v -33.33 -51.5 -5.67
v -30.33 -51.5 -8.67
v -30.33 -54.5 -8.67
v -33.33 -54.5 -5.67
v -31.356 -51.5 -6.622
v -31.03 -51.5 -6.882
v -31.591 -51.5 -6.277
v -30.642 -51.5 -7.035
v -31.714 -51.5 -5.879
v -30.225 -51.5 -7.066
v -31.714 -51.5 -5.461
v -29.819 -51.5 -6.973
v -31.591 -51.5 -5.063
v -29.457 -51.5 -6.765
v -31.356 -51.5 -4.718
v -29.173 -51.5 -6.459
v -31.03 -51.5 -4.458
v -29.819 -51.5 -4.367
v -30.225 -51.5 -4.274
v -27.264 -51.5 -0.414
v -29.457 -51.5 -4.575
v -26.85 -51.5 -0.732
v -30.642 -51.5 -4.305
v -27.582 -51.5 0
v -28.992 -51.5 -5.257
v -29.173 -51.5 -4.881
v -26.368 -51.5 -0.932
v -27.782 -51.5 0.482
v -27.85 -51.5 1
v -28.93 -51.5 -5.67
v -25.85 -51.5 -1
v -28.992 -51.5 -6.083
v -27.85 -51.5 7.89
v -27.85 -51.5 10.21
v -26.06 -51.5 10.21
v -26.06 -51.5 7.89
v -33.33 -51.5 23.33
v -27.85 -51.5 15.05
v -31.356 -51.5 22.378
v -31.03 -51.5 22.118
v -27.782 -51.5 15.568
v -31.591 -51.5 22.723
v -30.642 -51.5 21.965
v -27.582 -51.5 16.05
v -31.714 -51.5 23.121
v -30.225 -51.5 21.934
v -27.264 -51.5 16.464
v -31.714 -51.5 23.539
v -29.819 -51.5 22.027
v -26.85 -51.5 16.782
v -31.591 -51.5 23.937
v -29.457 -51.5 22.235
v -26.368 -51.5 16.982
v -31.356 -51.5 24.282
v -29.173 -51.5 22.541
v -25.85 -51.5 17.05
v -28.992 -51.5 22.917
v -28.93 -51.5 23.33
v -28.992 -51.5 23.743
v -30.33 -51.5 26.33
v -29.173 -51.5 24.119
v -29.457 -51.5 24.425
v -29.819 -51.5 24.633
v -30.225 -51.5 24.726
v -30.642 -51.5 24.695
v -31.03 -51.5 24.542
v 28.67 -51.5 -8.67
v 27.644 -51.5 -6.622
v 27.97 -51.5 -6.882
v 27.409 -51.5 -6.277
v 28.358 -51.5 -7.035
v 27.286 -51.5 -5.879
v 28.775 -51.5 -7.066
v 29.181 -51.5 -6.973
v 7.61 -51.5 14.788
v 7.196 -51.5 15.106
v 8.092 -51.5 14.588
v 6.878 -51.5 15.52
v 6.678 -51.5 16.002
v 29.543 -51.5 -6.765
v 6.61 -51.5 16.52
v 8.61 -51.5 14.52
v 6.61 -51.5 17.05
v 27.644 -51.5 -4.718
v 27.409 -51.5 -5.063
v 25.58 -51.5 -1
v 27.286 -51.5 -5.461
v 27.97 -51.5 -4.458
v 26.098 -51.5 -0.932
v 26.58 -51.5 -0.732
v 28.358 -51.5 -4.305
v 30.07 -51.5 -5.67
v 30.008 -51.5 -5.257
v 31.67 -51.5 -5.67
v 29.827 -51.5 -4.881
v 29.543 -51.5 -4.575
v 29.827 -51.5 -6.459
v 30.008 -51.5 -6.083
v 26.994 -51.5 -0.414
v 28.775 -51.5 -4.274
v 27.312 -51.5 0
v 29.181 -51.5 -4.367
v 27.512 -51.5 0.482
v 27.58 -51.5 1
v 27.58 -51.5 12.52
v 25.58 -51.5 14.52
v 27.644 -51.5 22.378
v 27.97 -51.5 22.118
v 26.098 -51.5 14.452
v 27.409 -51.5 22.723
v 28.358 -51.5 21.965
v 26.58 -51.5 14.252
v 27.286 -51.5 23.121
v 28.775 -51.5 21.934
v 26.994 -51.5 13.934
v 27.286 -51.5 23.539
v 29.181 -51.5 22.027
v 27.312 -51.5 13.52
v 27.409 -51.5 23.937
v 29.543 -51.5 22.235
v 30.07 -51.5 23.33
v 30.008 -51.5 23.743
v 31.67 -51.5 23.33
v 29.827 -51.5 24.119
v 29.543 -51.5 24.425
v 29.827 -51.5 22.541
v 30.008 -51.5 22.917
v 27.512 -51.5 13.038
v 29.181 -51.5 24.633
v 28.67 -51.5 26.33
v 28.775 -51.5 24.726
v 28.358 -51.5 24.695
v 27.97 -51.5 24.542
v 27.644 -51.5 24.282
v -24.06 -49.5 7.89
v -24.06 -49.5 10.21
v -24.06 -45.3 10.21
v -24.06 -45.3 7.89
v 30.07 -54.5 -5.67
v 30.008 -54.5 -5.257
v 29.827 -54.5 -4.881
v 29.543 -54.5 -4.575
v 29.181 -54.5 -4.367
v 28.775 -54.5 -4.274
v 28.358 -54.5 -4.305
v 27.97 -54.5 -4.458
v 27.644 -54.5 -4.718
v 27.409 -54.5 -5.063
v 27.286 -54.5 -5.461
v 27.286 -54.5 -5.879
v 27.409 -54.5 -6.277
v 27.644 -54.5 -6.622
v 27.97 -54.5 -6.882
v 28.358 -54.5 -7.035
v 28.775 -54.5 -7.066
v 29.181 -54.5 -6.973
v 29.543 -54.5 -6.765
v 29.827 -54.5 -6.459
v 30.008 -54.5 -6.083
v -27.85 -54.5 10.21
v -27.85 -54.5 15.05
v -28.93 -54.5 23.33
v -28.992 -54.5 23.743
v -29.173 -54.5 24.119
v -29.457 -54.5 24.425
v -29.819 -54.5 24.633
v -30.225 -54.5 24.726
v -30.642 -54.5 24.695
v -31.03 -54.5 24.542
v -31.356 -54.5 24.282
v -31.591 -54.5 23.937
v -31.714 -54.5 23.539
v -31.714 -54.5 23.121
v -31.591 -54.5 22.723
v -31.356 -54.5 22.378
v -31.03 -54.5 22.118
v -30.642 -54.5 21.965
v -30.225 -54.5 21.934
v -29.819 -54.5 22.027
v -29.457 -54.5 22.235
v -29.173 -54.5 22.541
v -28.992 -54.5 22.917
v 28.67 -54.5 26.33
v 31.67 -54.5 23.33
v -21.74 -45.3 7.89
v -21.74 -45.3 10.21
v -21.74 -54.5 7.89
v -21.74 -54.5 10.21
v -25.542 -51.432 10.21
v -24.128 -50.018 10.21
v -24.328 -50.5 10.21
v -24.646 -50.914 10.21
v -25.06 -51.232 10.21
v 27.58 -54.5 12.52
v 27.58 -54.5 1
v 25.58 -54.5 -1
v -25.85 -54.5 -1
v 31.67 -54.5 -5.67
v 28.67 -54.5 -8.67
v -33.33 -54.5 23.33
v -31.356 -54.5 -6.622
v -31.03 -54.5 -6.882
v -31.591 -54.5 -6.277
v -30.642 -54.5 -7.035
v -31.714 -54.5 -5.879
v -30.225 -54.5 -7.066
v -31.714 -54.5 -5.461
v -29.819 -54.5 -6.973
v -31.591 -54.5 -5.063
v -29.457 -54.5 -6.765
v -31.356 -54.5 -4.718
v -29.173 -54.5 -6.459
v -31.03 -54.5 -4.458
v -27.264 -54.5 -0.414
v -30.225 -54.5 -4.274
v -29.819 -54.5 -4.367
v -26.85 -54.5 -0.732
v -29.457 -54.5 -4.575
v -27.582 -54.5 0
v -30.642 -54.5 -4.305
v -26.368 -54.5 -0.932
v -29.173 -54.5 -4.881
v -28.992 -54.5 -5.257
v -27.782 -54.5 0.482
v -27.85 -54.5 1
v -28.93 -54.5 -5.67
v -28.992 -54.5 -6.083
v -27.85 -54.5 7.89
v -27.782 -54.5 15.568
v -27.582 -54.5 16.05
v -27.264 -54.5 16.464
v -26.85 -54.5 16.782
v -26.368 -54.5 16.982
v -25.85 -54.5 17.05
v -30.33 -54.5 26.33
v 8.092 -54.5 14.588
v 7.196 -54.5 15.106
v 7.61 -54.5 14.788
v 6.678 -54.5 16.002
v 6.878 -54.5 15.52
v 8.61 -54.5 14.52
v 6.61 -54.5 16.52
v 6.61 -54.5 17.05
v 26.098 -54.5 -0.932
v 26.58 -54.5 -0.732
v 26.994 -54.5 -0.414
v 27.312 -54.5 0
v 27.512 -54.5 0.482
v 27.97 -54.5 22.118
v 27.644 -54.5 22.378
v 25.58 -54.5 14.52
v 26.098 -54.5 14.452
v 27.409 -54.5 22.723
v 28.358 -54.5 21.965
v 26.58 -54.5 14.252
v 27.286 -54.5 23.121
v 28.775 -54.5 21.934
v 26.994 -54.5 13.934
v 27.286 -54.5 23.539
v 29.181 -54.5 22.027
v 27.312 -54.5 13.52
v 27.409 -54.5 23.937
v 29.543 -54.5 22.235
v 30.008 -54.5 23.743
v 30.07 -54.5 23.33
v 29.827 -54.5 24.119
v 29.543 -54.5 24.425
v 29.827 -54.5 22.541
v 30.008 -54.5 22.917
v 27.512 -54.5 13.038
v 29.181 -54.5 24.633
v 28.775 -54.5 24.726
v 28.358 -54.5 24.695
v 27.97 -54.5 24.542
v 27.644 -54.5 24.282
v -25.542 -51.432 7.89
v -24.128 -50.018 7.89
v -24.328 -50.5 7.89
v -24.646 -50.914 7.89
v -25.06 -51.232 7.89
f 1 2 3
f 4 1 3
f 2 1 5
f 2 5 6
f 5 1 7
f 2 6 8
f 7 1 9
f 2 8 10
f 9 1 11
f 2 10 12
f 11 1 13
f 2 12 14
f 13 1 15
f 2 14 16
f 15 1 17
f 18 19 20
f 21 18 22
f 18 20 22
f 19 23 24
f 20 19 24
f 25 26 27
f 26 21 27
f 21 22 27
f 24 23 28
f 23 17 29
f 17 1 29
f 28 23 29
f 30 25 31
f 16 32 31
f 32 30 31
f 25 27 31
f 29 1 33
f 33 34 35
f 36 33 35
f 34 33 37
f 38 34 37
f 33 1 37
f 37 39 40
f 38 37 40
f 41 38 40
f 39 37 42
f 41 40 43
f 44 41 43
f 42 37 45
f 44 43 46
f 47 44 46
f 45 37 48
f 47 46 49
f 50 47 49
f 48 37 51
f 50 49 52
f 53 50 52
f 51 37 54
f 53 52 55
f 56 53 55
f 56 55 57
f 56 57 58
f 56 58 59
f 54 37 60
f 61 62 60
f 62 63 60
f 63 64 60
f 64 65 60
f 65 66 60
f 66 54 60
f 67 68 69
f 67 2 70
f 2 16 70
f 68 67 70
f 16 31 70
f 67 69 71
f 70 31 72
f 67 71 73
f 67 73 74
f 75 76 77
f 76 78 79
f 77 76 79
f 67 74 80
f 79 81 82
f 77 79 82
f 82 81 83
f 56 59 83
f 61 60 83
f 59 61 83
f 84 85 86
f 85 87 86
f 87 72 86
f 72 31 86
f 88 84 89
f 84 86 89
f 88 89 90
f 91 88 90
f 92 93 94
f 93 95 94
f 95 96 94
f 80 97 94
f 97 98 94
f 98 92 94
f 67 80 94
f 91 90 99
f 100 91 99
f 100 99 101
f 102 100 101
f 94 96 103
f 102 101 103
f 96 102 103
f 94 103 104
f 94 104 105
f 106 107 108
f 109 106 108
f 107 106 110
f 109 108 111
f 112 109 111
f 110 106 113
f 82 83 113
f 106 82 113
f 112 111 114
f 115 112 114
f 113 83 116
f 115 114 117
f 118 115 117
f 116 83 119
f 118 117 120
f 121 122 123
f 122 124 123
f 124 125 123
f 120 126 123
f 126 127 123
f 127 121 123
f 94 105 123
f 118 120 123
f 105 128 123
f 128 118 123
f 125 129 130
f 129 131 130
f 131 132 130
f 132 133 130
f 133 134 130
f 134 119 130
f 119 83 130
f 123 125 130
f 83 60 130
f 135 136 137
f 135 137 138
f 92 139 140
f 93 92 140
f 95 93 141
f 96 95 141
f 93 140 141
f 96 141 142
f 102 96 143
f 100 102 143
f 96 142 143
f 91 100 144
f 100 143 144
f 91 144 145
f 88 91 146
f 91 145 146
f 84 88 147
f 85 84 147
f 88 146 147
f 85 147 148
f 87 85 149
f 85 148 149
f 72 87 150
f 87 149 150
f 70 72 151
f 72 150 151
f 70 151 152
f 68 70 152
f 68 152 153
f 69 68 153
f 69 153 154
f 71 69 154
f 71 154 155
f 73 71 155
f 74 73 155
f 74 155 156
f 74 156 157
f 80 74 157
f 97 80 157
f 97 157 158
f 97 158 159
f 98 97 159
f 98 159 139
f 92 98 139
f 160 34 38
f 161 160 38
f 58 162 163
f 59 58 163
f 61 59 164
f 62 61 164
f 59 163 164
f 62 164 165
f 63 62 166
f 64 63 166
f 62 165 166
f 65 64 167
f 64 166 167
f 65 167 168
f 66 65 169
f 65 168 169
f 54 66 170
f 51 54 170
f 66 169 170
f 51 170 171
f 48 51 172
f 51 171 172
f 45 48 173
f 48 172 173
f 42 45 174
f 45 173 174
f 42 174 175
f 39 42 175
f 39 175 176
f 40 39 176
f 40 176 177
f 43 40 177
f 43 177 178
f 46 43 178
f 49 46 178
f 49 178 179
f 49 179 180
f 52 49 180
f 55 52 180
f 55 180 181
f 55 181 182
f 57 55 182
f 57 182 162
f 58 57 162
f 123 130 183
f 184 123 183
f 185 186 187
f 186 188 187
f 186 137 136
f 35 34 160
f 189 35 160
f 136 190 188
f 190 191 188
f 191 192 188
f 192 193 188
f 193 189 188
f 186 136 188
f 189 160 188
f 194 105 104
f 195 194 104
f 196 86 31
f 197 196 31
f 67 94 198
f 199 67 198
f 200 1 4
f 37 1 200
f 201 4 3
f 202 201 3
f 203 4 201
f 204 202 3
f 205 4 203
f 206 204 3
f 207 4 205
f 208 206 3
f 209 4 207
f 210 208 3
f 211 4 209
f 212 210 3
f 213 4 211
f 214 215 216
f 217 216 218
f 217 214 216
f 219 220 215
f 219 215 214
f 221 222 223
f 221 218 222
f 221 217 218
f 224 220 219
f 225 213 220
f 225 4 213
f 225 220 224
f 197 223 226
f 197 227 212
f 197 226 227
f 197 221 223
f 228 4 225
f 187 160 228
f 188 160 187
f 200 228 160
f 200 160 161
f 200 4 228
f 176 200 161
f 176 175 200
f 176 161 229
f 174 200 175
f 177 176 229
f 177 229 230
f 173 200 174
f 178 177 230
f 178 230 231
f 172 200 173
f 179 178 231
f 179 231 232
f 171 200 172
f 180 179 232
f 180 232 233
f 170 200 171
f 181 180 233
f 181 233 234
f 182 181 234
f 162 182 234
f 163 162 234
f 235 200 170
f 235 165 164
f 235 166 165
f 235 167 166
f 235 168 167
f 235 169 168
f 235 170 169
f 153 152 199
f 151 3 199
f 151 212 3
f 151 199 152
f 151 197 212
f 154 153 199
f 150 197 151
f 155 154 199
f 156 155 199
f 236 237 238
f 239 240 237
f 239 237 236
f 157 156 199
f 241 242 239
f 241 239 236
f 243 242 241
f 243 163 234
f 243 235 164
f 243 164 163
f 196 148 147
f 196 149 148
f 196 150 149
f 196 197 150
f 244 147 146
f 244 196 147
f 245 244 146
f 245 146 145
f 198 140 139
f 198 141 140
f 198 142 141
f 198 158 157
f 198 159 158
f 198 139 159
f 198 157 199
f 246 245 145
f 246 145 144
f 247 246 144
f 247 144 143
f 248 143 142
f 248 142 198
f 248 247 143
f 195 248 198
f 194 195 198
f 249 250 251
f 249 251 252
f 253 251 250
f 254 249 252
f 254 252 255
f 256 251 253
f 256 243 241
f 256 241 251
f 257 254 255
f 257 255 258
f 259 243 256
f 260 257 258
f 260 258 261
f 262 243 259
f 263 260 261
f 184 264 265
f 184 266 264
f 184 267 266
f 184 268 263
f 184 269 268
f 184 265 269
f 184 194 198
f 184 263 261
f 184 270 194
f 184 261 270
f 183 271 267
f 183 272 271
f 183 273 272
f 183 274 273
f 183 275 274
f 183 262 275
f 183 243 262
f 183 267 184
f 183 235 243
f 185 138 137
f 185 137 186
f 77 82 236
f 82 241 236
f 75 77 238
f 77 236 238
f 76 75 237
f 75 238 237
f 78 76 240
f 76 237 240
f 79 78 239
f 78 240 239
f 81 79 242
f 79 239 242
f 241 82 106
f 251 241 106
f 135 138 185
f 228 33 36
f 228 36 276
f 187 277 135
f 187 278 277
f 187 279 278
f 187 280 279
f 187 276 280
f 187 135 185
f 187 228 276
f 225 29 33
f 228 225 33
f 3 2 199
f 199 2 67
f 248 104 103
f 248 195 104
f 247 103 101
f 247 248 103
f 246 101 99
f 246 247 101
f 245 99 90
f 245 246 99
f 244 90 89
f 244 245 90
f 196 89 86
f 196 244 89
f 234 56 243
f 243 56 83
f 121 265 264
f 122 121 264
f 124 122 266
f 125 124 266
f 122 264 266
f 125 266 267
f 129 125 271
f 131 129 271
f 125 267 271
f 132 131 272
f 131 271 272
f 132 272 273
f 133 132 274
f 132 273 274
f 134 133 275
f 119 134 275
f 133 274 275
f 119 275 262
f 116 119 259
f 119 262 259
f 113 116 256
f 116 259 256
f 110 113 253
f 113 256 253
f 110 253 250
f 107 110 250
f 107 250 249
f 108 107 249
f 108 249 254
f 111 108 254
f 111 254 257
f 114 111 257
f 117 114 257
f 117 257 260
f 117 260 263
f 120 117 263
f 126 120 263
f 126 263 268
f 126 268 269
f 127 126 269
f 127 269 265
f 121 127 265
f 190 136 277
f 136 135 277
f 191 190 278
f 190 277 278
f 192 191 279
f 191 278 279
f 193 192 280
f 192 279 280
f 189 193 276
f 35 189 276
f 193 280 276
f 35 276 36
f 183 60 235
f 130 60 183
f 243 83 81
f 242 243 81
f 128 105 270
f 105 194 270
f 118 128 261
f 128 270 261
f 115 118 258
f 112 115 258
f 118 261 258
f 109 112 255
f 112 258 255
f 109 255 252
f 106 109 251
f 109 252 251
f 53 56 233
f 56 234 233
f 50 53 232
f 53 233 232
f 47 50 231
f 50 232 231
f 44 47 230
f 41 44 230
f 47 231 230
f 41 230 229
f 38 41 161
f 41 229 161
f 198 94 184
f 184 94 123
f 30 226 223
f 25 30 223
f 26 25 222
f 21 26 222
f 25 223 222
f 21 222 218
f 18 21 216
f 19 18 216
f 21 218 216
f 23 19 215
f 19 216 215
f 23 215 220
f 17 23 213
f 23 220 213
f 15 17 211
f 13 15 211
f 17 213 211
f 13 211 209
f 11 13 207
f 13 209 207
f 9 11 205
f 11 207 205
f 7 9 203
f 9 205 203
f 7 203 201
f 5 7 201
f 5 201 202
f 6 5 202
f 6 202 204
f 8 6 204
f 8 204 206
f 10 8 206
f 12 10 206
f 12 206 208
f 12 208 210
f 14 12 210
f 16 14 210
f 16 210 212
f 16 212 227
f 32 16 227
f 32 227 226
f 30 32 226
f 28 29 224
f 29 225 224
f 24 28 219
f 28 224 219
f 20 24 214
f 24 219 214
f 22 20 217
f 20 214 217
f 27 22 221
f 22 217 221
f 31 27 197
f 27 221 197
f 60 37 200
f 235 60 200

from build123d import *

# Parameters (mm, degrees)
SKETCH044_W     = 65
SKETCH044_H     = 35
PAD003_DEPTH    = 3
CHAMFER009_SIZE = 3
SKETCH054_W     = 2.32
SKETCH054_H     = 2.32
PAD004_DEPTH    = 6.2
FILLET_R        = 2
SKETCH055_R     = 1.4
POCKET007_DEPTH = 5


with BuildPart() as part:
    # Sketch044 → Pad003 (new body)
    with BuildSketch(Plane.XZ):
        with Locations((-0.83, 8.83)):
            Rectangle(SKETCH044_W, SKETCH044_H)
        Polygon((0, -1), (-27.85, -1), (-27.85, 7.89), (-21.74, 7.89), (-21.74, 10.21), (-27.85, 10.21), (-27.85, 17.05), (6.61, 17.05), (6.61, 14.52), (27.58, 14.52), (27.58, -1), align=None, mode=Mode.SUBTRACT)
    extrude(amount=PAD003_DEPTH)

    # Chamfer009
    chamfer009_edges = [part.edges().sort_by_distance(p)[0] for p in [
        (31.67, -1.5, 26.33),
        (31.67, -1.5, -8.67),
        (-33.33, -1.5, 26.33),
        (-33.33, -1.5, -8.67),
    ]]
    chamfer(chamfer009_edges, length=CHAMFER009_SIZE)

    # Sketch054 (on Face2 of Chamfer009) → Pad004 (join)
    with BuildSketch(Plane(origin=(0, 0, 0), x_dir=(1, 0, 0), z_dir=(0, 1, 0))):
        with Locations((-22.9, -9.05)):
            Rectangle(SKETCH054_W, SKETCH054_H)
    extrude(amount=PAD004_DEPTH)

    # Fillet
    fillet_edges = [part.edges().sort_by_distance(p)[0] for p in [
        (-27.85, -1.5, 17.05),
        (6.61, -1.5, 14.52),
        (27.58, -1.5, 14.52),
        (-27.85, -1.5, -1),
        (27.58, -1.5, -1),
        (-24.06, 0, 9.05),
    ]]
    fillet(fillet_edges, radius=FILLET_R)

    # Sketch055 (on Face26 of Fillet) → Pocket007 (cut)
    with BuildSketch(Plane.XZ.offset(3)):
        with Locations((-30.33, 23.33)):
            Circle(SKETCH055_R)
        with Locations((28.67, 23.33)):
            Circle(SKETCH055_R)
        with Locations((-30.33, -5.67)):
            Circle(SKETCH055_R)
        with Locations((28.67, -5.67)):
            Circle(SKETCH055_R)
    extrude(amount=-POCKET007_DEPTH, mode=Mode.SUBTRACT)


with BuildPart() as part_1:
    # Body013 placement: moved
    add(part.part.moved(Location((0, -51.5, 0))))


solid = part_1.part
